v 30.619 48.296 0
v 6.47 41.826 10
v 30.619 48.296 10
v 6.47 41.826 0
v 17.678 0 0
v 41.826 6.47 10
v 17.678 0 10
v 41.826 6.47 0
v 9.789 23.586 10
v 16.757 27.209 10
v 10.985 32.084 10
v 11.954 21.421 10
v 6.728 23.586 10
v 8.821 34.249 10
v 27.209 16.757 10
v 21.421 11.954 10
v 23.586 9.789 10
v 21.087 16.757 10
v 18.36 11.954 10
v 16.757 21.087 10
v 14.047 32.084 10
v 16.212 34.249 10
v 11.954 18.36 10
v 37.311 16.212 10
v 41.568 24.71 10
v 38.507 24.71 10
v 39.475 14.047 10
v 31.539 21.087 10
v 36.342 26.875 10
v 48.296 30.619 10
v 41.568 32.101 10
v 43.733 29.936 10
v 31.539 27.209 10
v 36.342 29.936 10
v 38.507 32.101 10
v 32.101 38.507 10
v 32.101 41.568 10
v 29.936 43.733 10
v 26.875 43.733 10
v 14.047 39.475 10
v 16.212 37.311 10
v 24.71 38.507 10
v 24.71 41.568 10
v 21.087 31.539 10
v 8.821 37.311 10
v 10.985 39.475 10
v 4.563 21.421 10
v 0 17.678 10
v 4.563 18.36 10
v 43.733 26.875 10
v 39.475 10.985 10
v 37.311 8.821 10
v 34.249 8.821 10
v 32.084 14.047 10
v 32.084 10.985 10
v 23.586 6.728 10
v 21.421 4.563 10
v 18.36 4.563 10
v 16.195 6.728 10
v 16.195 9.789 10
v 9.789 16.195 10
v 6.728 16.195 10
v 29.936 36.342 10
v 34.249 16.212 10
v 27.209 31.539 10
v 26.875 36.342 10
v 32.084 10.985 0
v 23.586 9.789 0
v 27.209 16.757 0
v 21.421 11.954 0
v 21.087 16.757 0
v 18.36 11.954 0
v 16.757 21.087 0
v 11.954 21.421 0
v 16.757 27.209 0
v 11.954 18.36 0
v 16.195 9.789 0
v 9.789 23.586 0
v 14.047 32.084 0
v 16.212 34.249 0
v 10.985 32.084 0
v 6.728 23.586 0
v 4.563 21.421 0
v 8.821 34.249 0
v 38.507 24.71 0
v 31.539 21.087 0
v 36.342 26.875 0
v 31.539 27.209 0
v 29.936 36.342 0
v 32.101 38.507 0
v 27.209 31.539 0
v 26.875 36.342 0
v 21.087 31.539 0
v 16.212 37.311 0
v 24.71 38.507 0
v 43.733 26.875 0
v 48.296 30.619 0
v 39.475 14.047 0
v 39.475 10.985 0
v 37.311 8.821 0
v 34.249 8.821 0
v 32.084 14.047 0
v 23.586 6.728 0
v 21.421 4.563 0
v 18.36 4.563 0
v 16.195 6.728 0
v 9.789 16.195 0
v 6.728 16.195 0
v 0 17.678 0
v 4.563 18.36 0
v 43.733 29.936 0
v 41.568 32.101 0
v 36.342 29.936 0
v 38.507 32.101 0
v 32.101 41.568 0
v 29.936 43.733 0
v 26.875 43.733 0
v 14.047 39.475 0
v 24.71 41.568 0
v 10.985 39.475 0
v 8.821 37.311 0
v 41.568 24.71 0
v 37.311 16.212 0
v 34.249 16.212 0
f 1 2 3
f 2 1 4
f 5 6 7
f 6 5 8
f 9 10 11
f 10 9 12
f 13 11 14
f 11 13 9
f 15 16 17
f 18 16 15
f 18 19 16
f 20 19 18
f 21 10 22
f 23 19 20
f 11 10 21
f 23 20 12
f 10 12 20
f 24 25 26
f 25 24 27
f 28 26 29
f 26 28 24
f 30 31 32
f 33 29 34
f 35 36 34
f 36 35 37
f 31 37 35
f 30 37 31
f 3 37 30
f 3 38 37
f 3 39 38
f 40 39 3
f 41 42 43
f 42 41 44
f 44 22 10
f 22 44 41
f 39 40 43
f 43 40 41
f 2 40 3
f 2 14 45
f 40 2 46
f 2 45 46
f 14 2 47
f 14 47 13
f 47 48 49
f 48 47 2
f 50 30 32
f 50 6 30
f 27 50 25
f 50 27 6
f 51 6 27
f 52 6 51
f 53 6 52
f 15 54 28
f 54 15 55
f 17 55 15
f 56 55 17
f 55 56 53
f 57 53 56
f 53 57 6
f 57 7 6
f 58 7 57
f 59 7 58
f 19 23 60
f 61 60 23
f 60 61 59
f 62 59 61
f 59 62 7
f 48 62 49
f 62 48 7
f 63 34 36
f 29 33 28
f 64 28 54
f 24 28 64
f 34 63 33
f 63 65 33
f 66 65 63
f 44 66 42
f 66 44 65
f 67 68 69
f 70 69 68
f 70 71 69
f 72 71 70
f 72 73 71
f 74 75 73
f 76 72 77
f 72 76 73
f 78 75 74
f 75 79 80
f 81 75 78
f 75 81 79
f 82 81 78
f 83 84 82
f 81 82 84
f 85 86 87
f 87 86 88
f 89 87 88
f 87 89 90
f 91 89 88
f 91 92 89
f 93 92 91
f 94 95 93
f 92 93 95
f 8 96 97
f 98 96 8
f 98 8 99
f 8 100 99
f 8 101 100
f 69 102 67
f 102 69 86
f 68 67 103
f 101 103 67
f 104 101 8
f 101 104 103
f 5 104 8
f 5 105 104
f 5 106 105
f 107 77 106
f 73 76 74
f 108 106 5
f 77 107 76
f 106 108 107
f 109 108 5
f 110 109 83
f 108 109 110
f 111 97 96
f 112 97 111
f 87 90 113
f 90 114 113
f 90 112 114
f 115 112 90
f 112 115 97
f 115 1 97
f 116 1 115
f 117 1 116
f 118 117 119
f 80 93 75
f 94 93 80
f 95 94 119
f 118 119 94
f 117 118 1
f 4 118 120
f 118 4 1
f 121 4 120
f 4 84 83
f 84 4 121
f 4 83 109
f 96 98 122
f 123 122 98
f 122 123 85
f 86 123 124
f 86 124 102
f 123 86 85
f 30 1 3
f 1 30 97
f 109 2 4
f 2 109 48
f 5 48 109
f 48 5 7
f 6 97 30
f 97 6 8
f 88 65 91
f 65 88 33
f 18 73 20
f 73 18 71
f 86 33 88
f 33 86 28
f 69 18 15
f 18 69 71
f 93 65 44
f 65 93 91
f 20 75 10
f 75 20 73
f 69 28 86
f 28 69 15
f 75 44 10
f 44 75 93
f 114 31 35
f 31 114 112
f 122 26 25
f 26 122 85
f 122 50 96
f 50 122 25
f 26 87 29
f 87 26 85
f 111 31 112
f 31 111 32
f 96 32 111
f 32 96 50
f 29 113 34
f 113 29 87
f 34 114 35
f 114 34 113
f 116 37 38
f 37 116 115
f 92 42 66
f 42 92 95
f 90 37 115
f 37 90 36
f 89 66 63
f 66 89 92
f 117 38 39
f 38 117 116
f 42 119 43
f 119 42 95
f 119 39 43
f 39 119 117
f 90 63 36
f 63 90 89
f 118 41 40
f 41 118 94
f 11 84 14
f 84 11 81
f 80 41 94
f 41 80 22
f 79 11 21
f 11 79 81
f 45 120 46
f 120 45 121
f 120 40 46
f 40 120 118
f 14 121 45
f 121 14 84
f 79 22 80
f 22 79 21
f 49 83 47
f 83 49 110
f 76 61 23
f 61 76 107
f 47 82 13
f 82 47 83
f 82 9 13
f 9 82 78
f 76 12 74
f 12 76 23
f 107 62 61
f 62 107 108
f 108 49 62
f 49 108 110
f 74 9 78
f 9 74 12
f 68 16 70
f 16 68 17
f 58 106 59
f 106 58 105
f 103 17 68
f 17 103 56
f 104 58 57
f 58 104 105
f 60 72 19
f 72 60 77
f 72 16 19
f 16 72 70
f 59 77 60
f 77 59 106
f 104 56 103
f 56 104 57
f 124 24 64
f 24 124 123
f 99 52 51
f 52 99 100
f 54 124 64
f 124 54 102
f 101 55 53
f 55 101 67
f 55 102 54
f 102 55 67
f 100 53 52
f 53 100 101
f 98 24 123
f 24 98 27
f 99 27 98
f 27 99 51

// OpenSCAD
$fn = 32;

// ----------------------------------------------------------------------
// Polygon plate: 6-gon R25, 6 bolt windows
// ----------------------------------------------------------------------

// --- parameters (mm) ---
sides = 6;                // number of polygon sides
plate_r = 25;             // circumscribed radius of the polygon
bore_r = 8;               // centre bore radius
bolts = 6;                // number of bolt windows
ring_r = 16.45;           // bolt-circle radius
bolt_r = 4;               // bolt window radius
plate_t = 10;             // plate thickness, Z (extrusion height)

plate_d = 2 * plate_r;  // circumscribed diameter
bore_d = 2 * bore_r;  // centre bore diameter
bolt_d = 2 * bolt_r;  // bolt window diameter
ring_d = 2 * ring_r;  // bolt-circle diameter

profile = [[48.296, 30.619], [30.619, 48.296], [6.47, 41.826], [0, 17.678], [17.678, 0], [41.826, 6.47]];  // primary outline, 6 points, counter clockwise
void_1 = [[31.539, 27.209], [27.209, 31.539], [21.087, 31.539], [16.757, 27.209], [16.757, 21.087], [21.087, 16.757], [27.209, 16.757], [31.539, 21.087]];  // centre bore, 8 points
void_2 = [[43.733, 29.936], [41.568, 32.101], [38.507, 32.101], [36.342, 29.936], [36.342, 26.875], [38.507, 24.71], [41.568, 24.71], [43.733, 26.875]];  // bolt window 1, 8 points
void_3 = [[32.101, 41.568], [29.936, 43.733], [26.875, 43.733], [24.71, 41.568], [24.71, 38.507], [26.875, 36.342], [29.936, 36.342], [32.101, 38.507]];  // bolt window 2, 8 points
void_4 = [[16.212, 37.311], [14.047, 39.475], [10.985, 39.475], [8.821, 37.311], [8.821, 34.249], [10.985, 32.084], [14.047, 32.084], [16.212, 34.249]];  // bolt window 3, 8 points
void_5 = [[11.954, 21.421], [9.789, 23.586], [6.728, 23.586], [4.563, 21.421], [4.563, 18.36], [6.728, 16.195], [9.789, 16.195], [11.954, 18.36]];  // bolt window 4, 8 points
void_6 = [[23.586, 9.789], [21.421, 11.954], [18.36, 11.954], [16.195, 9.789], [16.195, 6.728], [18.36, 4.563], [21.421, 4.563], [23.586, 6.728]];  // bolt window 5, 8 points
void_7 = [[39.475, 14.047], [37.311, 16.212], [34.249, 16.212], [32.084, 14.047], [32.084, 10.985], [34.249, 8.821], [37.311, 8.821], [39.475, 10.985]];  // bolt window 6, 8 points

// --- the one profile operation ---
difference() {
  linear_extrude(height = plate_t) polygon(points = profile);
  translate([0, 0, -1])
    linear_extrude(height = plate_t + 2) polygon(points = void_1);
  translate([0, 0, -1])
    linear_extrude(height = plate_t + 2) polygon(points = void_2);
  translate([0, 0, -1])
    linear_extrude(height = plate_t + 2) polygon(points = void_3);
  translate([0, 0, -1])
    linear_extrude(height = plate_t + 2) polygon(points = void_4);
  translate([0, 0, -1])
    linear_extrude(height = plate_t + 2) polygon(points = void_5);
  translate([0, 0, -1])
    linear_extrude(height = plate_t + 2) polygon(points = void_6);
  translate([0, 0, -1])
    linear_extrude(height = plate_t + 2) polygon(points = void_7);
}
